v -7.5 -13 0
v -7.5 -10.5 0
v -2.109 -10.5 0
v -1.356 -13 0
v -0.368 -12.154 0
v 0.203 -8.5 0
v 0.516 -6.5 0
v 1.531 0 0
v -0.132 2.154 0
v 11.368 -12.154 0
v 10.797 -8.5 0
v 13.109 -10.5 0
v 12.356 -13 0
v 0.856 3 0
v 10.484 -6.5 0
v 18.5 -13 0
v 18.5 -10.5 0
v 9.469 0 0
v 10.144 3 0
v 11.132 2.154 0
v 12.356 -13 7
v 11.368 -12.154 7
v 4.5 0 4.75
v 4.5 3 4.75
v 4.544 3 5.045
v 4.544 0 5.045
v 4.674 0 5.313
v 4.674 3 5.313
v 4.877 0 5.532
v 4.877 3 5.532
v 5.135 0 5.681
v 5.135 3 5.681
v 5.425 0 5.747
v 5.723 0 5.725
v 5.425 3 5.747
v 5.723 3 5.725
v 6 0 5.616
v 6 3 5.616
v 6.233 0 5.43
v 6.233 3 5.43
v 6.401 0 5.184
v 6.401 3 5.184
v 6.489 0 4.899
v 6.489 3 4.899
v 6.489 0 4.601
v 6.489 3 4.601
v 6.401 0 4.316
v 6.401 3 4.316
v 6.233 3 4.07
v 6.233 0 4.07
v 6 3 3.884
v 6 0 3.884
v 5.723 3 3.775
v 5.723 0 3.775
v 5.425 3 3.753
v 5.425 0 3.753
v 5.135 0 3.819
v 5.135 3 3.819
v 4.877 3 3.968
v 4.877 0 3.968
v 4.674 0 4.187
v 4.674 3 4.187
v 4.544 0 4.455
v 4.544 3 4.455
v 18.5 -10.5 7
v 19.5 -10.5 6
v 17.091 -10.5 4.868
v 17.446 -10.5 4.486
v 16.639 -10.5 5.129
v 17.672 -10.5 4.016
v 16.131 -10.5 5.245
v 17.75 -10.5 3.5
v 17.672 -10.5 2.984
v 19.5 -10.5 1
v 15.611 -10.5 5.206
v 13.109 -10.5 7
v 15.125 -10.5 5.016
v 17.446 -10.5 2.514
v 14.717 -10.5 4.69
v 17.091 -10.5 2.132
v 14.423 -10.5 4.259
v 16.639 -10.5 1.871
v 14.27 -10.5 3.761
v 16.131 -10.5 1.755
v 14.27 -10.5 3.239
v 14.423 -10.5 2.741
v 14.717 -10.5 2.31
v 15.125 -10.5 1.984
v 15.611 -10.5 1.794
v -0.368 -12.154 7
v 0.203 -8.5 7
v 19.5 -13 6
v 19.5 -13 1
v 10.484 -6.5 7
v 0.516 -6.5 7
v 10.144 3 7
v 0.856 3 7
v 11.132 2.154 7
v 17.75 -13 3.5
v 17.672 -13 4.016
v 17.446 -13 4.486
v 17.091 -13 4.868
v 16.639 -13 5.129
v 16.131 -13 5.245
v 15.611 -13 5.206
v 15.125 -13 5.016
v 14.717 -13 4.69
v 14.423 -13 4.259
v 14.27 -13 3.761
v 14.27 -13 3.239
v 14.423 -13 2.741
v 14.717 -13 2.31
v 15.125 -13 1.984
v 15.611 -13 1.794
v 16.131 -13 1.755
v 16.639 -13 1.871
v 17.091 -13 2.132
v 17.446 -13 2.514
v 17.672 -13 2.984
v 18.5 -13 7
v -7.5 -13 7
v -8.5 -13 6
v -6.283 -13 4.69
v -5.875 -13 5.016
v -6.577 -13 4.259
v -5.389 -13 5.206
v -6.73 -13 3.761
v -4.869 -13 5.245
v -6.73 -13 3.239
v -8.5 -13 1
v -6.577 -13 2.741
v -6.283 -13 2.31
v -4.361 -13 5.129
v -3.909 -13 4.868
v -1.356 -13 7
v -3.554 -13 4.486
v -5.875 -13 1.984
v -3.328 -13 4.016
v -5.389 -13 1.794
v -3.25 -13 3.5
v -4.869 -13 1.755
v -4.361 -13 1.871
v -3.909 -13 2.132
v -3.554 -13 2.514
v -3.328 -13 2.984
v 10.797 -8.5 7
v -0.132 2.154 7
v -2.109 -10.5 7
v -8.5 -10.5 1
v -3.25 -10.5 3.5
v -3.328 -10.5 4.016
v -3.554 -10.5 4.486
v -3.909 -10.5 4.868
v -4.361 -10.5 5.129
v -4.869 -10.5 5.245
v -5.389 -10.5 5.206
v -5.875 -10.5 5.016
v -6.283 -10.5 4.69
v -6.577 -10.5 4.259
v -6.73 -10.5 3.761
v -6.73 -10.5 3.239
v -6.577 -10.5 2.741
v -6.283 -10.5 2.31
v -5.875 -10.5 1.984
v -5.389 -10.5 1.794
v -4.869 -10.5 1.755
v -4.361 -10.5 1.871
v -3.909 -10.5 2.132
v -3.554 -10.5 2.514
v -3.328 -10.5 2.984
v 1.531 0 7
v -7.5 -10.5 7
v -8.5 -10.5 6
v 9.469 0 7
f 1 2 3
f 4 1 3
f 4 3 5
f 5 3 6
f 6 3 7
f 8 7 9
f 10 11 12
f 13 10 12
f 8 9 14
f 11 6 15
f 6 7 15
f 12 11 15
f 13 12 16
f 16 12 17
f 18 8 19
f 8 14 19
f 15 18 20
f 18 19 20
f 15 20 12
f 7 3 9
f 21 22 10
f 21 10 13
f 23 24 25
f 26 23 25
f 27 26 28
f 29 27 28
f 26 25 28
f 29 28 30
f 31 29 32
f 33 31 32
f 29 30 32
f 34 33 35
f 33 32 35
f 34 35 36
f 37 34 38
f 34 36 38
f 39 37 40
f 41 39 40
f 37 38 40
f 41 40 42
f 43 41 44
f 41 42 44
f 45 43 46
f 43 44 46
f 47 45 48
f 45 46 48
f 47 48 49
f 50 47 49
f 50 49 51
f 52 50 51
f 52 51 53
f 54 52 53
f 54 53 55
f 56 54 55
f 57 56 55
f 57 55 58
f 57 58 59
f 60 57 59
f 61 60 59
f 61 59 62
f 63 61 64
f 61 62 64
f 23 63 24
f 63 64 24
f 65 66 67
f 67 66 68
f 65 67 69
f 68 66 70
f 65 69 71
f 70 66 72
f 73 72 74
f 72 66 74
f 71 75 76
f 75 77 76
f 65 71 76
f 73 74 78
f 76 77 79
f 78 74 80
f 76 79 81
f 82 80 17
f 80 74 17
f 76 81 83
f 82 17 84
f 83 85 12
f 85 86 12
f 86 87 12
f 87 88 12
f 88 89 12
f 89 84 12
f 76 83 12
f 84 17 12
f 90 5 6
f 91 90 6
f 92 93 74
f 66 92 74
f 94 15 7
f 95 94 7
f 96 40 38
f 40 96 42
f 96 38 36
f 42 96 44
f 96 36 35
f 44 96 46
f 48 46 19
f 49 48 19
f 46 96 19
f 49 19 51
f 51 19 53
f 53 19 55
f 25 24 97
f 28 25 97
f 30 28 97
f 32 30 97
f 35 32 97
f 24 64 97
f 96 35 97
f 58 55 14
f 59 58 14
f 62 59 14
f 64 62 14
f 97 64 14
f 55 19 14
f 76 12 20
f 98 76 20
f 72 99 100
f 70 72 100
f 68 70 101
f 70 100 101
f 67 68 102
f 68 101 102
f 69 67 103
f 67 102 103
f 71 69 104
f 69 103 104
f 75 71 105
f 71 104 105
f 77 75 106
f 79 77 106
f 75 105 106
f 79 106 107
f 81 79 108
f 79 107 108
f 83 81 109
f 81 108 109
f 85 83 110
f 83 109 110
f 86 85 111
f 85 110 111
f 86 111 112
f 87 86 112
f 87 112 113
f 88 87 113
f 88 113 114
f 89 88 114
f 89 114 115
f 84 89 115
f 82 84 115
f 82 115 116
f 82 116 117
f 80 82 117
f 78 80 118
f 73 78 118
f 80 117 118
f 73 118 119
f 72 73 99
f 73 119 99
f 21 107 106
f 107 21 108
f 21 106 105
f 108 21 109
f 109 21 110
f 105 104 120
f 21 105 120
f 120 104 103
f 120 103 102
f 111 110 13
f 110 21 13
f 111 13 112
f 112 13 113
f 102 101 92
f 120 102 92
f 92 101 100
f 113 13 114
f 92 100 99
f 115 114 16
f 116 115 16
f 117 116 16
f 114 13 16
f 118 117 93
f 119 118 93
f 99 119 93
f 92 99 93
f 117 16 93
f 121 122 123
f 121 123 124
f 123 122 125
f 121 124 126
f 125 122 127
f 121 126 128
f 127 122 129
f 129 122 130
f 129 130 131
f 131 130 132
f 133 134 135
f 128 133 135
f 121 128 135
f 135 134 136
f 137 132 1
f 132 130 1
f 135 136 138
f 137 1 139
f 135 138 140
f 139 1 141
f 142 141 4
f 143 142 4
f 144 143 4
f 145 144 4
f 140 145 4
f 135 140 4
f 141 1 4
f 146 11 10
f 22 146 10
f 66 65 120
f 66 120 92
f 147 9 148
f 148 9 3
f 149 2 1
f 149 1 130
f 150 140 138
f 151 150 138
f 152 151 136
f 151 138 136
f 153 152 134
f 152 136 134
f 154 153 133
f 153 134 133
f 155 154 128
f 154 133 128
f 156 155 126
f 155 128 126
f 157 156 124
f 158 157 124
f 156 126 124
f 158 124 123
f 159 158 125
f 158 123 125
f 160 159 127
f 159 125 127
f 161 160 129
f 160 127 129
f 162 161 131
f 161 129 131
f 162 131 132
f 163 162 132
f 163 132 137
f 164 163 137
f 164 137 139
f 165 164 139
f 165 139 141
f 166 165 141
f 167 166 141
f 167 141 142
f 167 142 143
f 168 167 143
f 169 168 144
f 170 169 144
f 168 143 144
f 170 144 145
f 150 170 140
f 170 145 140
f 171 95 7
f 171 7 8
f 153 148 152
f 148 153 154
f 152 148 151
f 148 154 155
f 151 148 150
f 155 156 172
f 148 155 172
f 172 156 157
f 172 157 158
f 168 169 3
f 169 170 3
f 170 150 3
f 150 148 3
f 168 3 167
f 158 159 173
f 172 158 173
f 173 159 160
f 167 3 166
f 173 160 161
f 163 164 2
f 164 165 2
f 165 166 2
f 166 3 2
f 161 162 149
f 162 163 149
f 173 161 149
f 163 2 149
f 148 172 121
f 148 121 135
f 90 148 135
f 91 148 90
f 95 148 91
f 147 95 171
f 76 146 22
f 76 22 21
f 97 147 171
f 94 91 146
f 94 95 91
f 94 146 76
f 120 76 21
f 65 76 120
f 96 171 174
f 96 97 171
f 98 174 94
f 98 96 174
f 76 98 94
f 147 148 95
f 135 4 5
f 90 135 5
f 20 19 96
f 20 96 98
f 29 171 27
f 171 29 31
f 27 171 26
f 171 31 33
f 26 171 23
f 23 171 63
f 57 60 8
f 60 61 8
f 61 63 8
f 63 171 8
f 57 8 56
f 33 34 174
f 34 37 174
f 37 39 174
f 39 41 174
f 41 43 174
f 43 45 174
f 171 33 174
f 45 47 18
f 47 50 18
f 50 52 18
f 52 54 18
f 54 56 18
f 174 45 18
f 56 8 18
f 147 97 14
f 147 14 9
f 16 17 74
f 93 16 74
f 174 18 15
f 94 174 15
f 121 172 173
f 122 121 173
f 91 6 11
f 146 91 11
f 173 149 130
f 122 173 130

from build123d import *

# Parameters (mm, degrees)
F1_DEPTH    = 7
F2_R        = 1.75
F3_DEPTH    = 2.5
F4_R        = 1
F5_DEPTH    = 3
F6_T1_DEPTH = 7.6433659759
F6_T3_DEPTH = 11.4332708022


# Not quite as in the source:
# - a fillet or chamfer that OpenCascade refuses, or shapes differently, is made with other operations: its cross-section is extruded or revolved along the edge and cut away or added


with BuildPart() as f1:
    # F0 (on Top) → F1 (new body)
    with BuildSketch(Plane.XY):
        Polygon((0, 3), (0, 0), (1.53125, 0), (9.46875, 0), (11, 0), (11, 3), align=None)
        Polygon((1.53125, 0), (0, 0), (0, 3), (-2.109375, -10.5), (-2.5, -13), (-0.5, -13), (0.203125, -8.5), (0.515625, -6.5), align=None)
        Polygon((10.484375, -6.5), (0.515625, -6.5), (0.203125, -8.5), (10.796875, -8.5), align=None)
        Polygon((11, 0), (9.46875, 0), (10.484375, -6.5), (10.796875, -8.5), (11.5, -13), (13.5, -13), (13.109375, -10.5), (11, 3), align=None)
        Polygon((19.5, -10.5), (13.109375, -10.5), (13.5, -13), (19.5, -13), align=None)
        Polygon((-2.5, -13), (-2.109375, -10.5), (-8.5, -10.5), (-8.5, -13), align=None)
    extrude(amount=F1_DEPTH)

    # F2 (on face) → F3 (cut, through all)
    with BuildSketch(Plane.XZ.offset(13)):
        with Locations((-5, 3.5)):
            Circle(F2_R)
        with Locations((16, 3.5)):
            Circle(F2_R)
    extrude(amount=-F3_DEPTH, mode=Mode.SUBTRACT)

    # F4 (on face) → F5 (cut, through all)
    with BuildSketch(Plane(origin=(0, 3, 0), x_dir=(-1, 0, 0), z_dir=(0, 1, 0))):
        with Locations((-5.5, 4.75)):
            Circle(F4_R)
    extrude(amount=-F5_DEPTH, mode=Mode.SUBTRACT)

    # F6: chamfer of 1 on 8 edges, made by hand

    # F6_s2 → F6_t1 (cut)
    with BuildSketch(Plane.XZ.offset(7.928317012)):
        Polygon((-7.5, 7), (-8.5, 6), (-8.5, 7), align=None)
        Polygon((-7.5, 0), (-8.5, 1), (-8.5, 0), align=None)
        Polygon((18.5, 7), (19.5, 6), (19.5, 7), align=None)
        Polygon((18.5, 0), (19.5, 1), (19.5, 0), align=None)
    extrude(amount=F6_T1_DEPTH, mode=Mode.SUBTRACT)

    # F6_s4 → F6_t3 (cut)
    with BuildSketch(Plane.XY.offset(-2.2166354011)):
        Polygon((0.8558834213, 3), (-0.1321286125, 2.1543768803), (0, 3), align=None)
        Polygon((10.1441165787, 3), (11.1321286125, 2.1543768803), (11, 3), align=None)
        Polygon((-1.3558834213, -13), (-0.3678713875, -12.1543768803), (-0.5, -13), align=None)
        Polygon((11.3678713875, -12.1543768803), (12.3558834213, -13), (11.5, -13), align=None)
    extrude(amount=F6_T3_DEPTH, mode=Mode.SUBTRACT)


solid = f1.part
